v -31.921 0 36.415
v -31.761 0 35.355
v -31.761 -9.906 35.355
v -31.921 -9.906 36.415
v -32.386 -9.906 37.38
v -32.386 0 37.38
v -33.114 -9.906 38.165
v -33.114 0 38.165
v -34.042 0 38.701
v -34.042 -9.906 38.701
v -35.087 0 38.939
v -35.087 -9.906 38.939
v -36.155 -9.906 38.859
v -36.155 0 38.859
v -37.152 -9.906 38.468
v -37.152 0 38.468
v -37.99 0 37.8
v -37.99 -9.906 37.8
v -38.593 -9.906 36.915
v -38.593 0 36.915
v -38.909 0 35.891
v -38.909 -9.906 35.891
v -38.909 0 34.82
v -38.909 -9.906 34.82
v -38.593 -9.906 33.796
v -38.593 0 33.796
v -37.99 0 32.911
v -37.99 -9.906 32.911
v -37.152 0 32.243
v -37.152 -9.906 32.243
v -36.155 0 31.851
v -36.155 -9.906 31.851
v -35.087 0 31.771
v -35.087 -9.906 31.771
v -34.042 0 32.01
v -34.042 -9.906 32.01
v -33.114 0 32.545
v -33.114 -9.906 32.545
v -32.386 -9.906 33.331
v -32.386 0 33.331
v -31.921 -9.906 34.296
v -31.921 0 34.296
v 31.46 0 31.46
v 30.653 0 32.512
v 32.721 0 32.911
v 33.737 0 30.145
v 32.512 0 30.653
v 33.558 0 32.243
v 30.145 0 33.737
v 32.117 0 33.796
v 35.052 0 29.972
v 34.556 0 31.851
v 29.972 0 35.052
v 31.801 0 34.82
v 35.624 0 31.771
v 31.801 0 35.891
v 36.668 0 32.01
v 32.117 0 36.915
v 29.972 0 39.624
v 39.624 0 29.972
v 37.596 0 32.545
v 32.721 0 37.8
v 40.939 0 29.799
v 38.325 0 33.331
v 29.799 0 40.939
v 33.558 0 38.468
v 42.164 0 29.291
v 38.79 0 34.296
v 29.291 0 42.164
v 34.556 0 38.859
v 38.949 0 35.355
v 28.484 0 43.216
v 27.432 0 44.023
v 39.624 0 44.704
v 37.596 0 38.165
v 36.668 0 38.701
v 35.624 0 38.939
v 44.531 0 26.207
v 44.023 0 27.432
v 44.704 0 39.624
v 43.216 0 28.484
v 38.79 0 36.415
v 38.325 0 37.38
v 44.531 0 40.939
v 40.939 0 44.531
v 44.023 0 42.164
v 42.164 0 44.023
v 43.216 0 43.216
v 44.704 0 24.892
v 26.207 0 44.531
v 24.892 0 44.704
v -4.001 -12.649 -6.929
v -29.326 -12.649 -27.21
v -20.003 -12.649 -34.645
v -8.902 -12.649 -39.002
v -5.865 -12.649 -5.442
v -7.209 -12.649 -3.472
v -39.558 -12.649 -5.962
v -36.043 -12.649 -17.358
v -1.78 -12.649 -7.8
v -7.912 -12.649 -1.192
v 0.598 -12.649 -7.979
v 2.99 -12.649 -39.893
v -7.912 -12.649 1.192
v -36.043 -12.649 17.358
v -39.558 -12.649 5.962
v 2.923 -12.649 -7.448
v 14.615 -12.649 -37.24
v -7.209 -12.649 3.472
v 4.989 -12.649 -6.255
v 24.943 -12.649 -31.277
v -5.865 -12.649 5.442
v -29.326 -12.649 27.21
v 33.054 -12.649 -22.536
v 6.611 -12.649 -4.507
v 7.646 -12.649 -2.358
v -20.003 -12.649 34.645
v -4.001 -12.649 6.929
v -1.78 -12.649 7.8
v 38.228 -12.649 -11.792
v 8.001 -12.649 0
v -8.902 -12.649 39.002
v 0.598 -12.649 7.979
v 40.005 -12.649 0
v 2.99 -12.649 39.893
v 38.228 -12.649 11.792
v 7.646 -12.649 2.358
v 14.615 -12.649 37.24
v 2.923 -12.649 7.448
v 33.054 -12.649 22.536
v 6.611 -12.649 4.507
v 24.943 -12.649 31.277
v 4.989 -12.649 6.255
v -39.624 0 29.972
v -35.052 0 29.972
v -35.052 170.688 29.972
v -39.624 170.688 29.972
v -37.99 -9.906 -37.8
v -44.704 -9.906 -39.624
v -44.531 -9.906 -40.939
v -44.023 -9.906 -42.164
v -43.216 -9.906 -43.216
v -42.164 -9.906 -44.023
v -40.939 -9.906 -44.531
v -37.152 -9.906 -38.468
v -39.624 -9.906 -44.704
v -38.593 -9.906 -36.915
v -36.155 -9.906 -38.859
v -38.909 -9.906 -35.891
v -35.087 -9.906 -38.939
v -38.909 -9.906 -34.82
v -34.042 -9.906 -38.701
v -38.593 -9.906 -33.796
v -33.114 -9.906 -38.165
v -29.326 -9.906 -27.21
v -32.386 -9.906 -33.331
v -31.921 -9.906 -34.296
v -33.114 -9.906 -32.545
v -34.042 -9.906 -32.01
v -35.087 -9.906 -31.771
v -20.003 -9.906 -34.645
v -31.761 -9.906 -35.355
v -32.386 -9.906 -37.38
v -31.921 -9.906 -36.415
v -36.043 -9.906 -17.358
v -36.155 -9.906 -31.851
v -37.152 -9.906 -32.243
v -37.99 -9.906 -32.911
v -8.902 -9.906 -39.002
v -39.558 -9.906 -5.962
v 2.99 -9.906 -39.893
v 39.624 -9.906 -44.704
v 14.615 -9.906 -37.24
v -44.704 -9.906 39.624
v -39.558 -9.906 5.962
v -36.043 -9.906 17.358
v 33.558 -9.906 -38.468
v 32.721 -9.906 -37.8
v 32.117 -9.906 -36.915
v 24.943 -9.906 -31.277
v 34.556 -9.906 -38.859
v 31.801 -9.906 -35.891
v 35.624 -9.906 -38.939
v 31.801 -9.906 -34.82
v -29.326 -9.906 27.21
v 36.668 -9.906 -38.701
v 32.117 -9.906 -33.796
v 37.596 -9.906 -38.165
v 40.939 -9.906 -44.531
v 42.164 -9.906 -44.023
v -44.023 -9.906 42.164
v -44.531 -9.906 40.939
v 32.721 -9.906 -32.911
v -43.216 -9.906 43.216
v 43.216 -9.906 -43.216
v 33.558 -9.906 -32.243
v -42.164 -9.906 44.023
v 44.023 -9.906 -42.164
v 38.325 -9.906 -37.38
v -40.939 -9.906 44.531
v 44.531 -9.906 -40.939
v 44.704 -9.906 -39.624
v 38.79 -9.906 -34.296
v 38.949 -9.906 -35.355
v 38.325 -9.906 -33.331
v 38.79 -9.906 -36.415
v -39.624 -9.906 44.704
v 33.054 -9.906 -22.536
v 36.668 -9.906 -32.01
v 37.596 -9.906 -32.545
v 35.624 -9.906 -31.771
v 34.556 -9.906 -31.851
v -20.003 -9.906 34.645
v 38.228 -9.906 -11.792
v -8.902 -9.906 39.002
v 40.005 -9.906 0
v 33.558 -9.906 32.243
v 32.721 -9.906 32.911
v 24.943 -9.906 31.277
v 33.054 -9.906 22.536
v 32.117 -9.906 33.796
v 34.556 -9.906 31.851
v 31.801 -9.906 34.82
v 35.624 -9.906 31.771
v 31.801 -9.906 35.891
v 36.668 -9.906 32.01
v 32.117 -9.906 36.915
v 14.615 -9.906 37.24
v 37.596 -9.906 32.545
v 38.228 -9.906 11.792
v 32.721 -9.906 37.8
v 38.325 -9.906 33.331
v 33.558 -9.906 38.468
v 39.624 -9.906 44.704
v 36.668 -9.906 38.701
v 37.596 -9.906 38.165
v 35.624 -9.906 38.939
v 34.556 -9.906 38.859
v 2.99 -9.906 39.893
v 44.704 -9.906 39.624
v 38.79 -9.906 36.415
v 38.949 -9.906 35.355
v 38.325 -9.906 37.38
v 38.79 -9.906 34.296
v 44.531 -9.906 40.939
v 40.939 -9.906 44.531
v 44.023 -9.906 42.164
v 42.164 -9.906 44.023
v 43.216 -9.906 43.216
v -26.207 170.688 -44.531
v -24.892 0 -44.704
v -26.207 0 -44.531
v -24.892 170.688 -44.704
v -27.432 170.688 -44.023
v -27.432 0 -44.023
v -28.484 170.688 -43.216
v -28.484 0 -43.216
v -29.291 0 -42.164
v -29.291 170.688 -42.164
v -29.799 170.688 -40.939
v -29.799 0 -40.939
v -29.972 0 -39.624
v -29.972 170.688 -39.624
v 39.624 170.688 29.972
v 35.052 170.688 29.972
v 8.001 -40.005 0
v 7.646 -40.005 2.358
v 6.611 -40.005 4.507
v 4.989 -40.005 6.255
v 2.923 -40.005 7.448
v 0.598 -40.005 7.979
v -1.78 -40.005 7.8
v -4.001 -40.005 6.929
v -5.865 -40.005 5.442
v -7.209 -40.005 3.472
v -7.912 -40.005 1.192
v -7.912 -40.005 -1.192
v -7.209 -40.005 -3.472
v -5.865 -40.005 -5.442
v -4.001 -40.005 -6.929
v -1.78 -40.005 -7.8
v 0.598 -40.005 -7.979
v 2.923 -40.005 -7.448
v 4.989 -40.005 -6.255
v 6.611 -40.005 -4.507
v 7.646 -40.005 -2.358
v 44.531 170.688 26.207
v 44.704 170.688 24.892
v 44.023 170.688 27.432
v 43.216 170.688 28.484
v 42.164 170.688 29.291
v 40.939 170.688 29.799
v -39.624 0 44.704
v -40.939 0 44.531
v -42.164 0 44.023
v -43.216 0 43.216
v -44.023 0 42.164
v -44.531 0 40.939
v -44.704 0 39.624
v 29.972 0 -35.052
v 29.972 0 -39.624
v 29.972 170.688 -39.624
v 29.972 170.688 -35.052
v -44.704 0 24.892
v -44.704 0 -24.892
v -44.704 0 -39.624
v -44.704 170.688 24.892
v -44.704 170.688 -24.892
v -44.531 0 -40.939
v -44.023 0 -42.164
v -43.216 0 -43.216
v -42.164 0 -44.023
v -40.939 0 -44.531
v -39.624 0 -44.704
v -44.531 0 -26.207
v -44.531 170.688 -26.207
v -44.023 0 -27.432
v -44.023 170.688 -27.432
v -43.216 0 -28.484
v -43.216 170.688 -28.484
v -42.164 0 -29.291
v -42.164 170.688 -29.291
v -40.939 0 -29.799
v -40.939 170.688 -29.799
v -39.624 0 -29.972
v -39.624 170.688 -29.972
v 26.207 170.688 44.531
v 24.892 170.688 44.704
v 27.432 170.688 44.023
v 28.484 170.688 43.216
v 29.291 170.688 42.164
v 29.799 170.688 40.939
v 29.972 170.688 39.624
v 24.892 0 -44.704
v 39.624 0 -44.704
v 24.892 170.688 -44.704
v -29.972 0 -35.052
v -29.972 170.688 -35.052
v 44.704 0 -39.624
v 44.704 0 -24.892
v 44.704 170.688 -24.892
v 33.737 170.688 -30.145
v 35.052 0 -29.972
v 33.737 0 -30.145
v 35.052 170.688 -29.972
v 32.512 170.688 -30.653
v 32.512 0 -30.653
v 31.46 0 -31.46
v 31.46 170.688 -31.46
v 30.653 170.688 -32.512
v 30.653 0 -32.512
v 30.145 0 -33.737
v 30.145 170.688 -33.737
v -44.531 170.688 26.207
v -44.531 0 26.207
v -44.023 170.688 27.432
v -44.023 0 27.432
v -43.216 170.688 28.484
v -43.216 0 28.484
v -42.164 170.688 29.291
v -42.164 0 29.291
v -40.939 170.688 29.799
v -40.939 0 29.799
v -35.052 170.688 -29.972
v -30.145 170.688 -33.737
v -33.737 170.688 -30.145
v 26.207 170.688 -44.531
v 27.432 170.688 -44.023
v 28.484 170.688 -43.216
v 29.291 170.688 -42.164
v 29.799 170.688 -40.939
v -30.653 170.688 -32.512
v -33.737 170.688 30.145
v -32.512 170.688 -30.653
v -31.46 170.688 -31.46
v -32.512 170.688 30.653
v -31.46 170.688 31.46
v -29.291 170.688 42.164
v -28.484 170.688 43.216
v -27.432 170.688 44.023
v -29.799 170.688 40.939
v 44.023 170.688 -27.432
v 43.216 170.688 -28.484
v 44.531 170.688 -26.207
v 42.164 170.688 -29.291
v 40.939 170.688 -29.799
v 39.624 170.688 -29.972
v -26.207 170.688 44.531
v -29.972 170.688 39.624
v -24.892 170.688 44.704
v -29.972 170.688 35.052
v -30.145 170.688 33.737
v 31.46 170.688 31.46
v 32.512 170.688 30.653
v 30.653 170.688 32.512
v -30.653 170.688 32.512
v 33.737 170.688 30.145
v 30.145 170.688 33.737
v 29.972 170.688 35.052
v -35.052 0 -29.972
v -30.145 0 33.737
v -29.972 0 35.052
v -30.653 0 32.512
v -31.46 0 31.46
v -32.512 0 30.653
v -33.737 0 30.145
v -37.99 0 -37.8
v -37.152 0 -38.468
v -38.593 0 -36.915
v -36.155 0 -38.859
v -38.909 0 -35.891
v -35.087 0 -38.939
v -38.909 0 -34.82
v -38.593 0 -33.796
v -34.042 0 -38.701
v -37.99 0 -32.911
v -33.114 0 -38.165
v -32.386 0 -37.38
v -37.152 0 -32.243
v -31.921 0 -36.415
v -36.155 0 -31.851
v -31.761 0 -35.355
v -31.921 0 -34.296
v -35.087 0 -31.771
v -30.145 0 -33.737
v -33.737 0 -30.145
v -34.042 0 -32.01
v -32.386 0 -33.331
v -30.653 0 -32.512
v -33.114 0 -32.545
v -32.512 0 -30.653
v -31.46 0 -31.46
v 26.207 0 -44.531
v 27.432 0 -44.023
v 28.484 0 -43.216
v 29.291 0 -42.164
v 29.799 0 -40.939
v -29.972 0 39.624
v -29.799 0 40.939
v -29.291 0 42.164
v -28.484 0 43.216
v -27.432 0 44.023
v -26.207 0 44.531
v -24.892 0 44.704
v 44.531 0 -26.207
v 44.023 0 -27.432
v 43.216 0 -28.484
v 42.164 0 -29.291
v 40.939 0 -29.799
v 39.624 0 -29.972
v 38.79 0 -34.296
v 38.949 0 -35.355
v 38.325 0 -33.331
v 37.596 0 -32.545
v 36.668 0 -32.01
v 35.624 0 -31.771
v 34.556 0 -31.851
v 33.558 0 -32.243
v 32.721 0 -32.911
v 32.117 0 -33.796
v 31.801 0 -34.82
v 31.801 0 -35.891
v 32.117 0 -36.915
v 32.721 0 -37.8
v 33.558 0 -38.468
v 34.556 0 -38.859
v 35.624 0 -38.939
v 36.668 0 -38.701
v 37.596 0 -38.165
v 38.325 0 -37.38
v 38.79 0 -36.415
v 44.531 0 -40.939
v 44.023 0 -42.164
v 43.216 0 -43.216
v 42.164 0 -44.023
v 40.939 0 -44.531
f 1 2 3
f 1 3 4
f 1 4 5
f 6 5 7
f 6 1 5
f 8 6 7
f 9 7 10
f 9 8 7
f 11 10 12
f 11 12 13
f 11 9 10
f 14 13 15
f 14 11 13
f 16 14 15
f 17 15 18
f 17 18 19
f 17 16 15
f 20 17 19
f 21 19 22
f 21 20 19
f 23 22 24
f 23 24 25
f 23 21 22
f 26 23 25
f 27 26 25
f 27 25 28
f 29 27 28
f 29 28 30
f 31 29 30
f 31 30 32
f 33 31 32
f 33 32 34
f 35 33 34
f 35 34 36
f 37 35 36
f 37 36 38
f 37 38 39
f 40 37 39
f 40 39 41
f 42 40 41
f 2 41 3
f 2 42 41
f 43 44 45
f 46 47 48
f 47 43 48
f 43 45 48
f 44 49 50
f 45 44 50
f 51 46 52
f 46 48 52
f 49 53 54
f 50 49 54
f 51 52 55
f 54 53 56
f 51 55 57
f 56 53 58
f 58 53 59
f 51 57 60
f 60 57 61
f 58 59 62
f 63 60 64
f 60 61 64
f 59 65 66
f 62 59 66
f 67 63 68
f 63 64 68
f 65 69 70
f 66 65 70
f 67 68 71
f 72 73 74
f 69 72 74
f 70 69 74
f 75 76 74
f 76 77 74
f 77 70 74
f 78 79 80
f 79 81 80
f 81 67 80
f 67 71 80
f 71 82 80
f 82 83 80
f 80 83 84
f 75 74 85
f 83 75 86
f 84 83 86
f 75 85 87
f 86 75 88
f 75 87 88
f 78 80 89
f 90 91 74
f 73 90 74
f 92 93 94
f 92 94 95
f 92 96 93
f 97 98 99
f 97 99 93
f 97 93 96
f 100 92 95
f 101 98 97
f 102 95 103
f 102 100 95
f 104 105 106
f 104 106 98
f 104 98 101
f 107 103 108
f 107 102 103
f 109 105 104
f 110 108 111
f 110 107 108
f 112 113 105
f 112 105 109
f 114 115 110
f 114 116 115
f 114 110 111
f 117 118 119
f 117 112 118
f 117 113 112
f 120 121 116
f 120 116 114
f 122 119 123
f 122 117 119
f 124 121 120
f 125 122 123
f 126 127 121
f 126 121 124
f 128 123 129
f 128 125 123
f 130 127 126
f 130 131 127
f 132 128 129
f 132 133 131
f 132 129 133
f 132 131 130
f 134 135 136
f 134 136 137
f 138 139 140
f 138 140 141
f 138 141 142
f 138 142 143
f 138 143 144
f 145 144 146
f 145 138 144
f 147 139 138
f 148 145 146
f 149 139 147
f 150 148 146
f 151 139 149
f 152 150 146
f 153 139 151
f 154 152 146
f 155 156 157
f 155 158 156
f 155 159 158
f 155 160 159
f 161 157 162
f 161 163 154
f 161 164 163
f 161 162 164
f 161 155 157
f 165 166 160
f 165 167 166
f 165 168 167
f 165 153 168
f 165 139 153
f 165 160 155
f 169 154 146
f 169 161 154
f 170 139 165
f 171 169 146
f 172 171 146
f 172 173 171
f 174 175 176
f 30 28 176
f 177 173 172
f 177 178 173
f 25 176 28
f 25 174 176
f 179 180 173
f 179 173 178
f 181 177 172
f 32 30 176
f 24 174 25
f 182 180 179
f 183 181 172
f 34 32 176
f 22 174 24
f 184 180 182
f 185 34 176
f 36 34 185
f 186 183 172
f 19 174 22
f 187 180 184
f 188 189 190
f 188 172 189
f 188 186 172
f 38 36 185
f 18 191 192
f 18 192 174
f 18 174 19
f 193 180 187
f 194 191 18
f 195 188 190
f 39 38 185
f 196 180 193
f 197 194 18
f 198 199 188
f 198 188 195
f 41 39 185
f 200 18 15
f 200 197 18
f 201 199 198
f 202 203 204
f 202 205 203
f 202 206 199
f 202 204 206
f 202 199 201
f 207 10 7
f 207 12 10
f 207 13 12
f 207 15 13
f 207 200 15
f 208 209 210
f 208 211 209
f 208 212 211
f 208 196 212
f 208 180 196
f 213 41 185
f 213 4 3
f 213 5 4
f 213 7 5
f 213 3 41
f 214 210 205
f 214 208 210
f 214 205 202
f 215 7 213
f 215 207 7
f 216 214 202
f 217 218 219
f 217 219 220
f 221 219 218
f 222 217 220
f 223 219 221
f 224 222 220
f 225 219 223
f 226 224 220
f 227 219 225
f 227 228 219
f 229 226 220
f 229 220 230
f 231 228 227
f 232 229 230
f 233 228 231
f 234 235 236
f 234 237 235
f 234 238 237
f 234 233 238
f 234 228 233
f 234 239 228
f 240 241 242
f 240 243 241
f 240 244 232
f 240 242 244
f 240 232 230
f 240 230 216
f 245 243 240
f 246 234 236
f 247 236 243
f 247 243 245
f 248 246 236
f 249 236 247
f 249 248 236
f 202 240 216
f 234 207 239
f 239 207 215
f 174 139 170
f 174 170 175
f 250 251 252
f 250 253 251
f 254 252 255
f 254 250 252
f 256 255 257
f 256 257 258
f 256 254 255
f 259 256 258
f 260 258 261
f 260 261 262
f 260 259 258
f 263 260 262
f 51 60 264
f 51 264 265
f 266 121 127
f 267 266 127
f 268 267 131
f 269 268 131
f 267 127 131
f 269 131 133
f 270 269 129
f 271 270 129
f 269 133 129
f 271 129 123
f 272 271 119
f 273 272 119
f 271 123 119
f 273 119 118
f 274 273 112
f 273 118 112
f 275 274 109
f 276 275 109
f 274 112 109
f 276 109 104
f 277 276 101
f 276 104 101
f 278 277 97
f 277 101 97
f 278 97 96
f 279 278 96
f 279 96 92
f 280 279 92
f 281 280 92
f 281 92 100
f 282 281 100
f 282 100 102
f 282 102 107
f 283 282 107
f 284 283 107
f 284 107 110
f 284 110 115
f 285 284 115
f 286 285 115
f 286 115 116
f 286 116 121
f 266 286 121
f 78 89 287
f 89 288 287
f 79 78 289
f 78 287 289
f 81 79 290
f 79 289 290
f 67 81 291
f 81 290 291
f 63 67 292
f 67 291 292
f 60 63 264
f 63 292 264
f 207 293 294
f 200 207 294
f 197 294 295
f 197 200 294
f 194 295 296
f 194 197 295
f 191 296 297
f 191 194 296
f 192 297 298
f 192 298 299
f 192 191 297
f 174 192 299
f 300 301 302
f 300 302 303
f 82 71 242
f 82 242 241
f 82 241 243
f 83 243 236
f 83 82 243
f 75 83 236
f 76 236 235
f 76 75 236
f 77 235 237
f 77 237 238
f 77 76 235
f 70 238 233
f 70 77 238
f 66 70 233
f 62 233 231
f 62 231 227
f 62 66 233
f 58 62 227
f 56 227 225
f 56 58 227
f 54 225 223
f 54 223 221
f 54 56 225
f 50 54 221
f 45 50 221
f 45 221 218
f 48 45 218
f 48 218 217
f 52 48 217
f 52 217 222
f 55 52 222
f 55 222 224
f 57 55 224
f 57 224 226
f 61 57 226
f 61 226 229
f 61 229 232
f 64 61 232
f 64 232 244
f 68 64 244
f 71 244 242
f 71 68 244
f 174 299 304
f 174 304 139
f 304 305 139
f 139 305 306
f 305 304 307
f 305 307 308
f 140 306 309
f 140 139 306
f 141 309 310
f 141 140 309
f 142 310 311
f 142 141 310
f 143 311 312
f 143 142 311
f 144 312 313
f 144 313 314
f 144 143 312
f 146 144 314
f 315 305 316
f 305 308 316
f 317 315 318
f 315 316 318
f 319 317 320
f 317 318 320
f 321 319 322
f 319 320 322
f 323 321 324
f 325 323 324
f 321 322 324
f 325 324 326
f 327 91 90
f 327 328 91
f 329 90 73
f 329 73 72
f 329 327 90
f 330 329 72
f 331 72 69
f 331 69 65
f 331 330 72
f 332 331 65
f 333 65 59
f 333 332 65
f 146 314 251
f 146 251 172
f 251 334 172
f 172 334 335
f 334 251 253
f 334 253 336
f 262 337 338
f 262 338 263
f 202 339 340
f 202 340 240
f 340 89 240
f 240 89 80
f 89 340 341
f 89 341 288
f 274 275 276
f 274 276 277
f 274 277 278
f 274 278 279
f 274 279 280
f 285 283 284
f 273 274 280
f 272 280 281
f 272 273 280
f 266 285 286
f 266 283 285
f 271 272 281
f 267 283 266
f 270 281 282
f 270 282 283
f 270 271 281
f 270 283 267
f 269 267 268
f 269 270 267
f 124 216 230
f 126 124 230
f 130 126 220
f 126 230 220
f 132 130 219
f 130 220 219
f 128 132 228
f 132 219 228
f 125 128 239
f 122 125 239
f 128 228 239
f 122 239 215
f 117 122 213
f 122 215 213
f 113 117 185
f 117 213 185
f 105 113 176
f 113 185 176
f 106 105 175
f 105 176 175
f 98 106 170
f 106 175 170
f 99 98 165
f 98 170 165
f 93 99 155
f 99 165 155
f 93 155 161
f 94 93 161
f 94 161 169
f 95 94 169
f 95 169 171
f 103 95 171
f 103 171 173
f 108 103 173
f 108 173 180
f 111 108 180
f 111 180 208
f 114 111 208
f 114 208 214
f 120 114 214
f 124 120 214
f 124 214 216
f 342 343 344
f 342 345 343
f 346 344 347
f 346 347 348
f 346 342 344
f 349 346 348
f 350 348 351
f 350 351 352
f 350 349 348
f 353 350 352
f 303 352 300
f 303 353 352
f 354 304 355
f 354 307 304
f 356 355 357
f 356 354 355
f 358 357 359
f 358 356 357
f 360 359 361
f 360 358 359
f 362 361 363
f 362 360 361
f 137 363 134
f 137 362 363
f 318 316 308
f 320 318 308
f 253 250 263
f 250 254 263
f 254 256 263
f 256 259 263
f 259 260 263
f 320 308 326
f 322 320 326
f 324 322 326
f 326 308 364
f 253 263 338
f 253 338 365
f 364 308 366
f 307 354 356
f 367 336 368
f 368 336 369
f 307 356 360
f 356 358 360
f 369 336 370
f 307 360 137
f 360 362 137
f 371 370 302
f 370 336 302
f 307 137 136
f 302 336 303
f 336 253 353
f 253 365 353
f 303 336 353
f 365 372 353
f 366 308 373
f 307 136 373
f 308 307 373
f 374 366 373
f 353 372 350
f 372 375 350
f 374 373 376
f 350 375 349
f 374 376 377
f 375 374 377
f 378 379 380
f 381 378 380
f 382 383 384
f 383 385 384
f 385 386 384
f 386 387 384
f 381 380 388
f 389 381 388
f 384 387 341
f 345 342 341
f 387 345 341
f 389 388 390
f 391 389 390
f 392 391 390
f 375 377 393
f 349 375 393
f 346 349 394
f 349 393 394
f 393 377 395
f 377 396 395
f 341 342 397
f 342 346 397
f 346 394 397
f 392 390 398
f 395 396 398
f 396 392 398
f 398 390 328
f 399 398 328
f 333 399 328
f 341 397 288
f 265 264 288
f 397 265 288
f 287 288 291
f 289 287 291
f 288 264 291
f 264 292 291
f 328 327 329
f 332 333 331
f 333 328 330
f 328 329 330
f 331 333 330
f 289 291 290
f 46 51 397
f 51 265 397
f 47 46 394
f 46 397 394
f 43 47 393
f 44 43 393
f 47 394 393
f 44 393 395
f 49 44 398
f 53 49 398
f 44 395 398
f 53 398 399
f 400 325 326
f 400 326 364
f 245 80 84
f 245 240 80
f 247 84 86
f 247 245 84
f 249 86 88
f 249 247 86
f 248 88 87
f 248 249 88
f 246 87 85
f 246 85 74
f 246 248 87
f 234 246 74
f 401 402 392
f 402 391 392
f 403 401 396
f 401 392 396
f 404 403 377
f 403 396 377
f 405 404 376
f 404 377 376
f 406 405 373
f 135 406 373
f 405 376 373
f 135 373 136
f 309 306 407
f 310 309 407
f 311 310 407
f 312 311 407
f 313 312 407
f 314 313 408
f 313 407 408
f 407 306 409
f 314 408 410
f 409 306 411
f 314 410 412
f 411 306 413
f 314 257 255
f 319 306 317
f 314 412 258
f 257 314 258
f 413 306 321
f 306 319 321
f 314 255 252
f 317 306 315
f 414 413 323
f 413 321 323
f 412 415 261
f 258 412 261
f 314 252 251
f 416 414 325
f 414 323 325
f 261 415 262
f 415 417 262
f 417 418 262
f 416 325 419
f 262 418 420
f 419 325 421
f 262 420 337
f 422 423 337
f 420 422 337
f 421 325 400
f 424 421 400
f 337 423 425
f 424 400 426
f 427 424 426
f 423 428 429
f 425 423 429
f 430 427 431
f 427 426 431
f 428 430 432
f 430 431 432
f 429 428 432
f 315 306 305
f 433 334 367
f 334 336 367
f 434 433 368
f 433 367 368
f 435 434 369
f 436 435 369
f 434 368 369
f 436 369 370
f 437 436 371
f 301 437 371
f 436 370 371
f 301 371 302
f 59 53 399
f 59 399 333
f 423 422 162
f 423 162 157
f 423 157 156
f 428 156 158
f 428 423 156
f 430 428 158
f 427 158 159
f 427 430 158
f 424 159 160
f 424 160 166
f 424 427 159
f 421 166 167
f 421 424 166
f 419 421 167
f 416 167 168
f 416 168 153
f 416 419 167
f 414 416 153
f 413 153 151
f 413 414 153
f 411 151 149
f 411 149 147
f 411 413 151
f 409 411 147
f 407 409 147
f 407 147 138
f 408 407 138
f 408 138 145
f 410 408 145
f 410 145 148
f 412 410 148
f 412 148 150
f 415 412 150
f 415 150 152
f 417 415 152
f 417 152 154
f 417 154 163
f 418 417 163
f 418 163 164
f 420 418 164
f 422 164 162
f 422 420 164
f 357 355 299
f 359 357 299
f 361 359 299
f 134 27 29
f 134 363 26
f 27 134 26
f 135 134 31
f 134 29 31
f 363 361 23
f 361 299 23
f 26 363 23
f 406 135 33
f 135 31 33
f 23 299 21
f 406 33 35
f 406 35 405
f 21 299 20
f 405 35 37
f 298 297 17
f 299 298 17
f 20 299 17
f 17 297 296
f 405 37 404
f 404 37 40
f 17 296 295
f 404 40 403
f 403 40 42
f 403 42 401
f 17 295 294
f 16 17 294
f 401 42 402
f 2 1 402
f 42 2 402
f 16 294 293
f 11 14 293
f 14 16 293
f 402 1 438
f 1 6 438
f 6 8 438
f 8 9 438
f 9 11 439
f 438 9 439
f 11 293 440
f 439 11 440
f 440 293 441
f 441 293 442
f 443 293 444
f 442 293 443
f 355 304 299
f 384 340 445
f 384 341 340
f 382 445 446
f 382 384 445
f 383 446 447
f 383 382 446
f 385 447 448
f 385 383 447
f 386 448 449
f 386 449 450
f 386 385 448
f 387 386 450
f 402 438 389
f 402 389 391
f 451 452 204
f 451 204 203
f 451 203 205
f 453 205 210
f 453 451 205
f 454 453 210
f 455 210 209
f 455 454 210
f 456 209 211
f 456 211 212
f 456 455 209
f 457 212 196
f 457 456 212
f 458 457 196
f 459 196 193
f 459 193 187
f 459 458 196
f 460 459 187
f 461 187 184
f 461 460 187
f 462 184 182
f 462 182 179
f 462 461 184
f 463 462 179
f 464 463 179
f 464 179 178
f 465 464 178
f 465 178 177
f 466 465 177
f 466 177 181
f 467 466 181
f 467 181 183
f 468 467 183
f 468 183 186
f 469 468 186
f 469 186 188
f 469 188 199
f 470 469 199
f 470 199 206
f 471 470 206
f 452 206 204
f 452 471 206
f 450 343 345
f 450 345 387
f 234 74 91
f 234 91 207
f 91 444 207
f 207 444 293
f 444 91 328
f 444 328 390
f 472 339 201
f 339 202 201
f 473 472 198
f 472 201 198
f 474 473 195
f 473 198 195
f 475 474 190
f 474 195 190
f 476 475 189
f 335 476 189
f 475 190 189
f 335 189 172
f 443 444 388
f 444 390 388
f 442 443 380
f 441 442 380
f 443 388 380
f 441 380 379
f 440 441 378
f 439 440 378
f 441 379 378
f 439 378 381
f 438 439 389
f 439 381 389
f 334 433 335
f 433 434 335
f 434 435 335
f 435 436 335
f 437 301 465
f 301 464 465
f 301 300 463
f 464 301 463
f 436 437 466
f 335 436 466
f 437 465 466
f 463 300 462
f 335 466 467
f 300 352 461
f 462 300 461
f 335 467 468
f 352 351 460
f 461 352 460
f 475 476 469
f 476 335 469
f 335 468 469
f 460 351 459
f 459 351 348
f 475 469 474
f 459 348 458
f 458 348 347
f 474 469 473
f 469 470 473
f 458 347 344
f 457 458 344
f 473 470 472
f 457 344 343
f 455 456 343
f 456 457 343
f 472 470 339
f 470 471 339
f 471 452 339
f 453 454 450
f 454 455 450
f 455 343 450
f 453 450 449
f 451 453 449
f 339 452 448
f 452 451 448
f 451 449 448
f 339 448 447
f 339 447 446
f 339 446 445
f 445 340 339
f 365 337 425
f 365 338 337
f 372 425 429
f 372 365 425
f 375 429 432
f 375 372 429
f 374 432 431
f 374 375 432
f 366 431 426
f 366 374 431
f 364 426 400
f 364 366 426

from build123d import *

# Parameters (mm, degrees)
F0_R     = 40.005
F0_R_2   = 8.001
F1_DEPTH = 170.688
F0_W     = 14.732
F0_H     = 14.732
F0_R_3   = 3.5941
F2_DEPTH = 9.906
F3_DEPTH = 12.6492
F4_DEPTH = 40.005
F5_R     = 5.08
F6_R     = 5.08


with BuildPart() as f1:
    # F0 (on Front) → F1 (new body)
    with BuildSketch(Plane.XZ):
        Polygon((-29.972, -29.972), (-29.972, -44.704), (-13.335, -44.704), (13.335, -44.704), (29.972, -44.704), (29.972, -29.972), (44.704, -29.972), (44.704, 29.972), (29.972, 29.972), (29.972, 44.704), (-29.972, 44.704), (-29.972, 29.972), (-44.704, 29.972), (-44.704, -29.972), align=None)
        Circle(F0_R, mode=Mode.SUBTRACT)
        Circle(F0_R)
        Circle(F0_R_2, mode=Mode.SUBTRACT)
        Circle(F0_R_2)
    extrude(amount=-F1_DEPTH)

    # F0 (on Front) → F2 (join)
    with BuildSketch(Plane.XZ):
        Polygon((-29.972, -29.972), (-29.972, -44.704), (-13.335, -44.704), (13.335, -44.704), (29.972, -44.704), (29.972, -29.972), (44.704, -29.972), (44.704, 29.972), (29.972, 29.972), (29.972, 44.704), (-29.972, 44.704), (-29.972, 29.972), (-44.704, 29.972), (-44.704, -29.972), align=None)
        Circle(F0_R, mode=Mode.SUBTRACT)
        with Locations((-37.338, 37.338)):
            Rectangle(F0_W, F0_H)
        with Locations((-35.355268, 35.355268)):
            Circle(F0_R_3, mode=Mode.SUBTRACT)
        with Locations((37.338, 37.338)):
            Rectangle(F0_W, F0_H)
        with Locations((35.355268, 35.355268)):
            Circle(F0_R_3, mode=Mode.SUBTRACT)
        with Locations((37.338, -37.338)):
            Rectangle(F0_W, F0_H)
        with Locations((35.355268, -35.355268)):
            Circle(F0_R_3, mode=Mode.SUBTRACT)
        with Locations((-37.338, -37.338)):
            Rectangle(F0_W, F0_H)
        with Locations((-35.355268, -35.355268)):
            Circle(F0_R_3, mode=Mode.SUBTRACT)
    extrude(amount=F2_DEPTH)

    # F0 (on Front) → F3 (join)
    with BuildSketch(Plane.XZ):
        Circle(F0_R)
        Circle(F0_R_2, mode=Mode.SUBTRACT)
    extrude(amount=F3_DEPTH)

    # F0 (on Front) → F4 (join)
    with BuildSketch(Plane.XZ):
        Circle(F0_R_2)
    extrude(amount=F4_DEPTH)

    # F5
    f5_edges = [f1.edges().sort_by_distance(p)[0] for p in [
        (44.704, 85.344, 29.972),
        (29.972, 85.344, 44.704),
        (44.704, 85.344, -29.972),
        (29.972, 85.344, -44.704),
        (-29.972, 85.344, -44.704),
        (-44.704, 85.344, -29.972),
        (-29.972, 85.344, 44.704),
        (-29.972, 85.344, 29.972),
        (-44.704, 85.344, 29.972),
        (-29.972, 85.344, -29.972),
        (29.972, 85.344, -29.972),
        (29.972, 85.344, 29.972),
    ]]
    fillet(f5_edges, radius=F5_R)

    # F6
    f6_edges = [f1.edges().sort_by_distance(p)[0] for p in [
        (-44.704, -4.953, 44.704),
        (-44.704, -4.953, -44.704),
        (44.704, -4.953, 44.704),
        (44.704, -4.953, -44.704),
    ]]
    fillet(f6_edges, radius=F6_R)


solid = f1.part
